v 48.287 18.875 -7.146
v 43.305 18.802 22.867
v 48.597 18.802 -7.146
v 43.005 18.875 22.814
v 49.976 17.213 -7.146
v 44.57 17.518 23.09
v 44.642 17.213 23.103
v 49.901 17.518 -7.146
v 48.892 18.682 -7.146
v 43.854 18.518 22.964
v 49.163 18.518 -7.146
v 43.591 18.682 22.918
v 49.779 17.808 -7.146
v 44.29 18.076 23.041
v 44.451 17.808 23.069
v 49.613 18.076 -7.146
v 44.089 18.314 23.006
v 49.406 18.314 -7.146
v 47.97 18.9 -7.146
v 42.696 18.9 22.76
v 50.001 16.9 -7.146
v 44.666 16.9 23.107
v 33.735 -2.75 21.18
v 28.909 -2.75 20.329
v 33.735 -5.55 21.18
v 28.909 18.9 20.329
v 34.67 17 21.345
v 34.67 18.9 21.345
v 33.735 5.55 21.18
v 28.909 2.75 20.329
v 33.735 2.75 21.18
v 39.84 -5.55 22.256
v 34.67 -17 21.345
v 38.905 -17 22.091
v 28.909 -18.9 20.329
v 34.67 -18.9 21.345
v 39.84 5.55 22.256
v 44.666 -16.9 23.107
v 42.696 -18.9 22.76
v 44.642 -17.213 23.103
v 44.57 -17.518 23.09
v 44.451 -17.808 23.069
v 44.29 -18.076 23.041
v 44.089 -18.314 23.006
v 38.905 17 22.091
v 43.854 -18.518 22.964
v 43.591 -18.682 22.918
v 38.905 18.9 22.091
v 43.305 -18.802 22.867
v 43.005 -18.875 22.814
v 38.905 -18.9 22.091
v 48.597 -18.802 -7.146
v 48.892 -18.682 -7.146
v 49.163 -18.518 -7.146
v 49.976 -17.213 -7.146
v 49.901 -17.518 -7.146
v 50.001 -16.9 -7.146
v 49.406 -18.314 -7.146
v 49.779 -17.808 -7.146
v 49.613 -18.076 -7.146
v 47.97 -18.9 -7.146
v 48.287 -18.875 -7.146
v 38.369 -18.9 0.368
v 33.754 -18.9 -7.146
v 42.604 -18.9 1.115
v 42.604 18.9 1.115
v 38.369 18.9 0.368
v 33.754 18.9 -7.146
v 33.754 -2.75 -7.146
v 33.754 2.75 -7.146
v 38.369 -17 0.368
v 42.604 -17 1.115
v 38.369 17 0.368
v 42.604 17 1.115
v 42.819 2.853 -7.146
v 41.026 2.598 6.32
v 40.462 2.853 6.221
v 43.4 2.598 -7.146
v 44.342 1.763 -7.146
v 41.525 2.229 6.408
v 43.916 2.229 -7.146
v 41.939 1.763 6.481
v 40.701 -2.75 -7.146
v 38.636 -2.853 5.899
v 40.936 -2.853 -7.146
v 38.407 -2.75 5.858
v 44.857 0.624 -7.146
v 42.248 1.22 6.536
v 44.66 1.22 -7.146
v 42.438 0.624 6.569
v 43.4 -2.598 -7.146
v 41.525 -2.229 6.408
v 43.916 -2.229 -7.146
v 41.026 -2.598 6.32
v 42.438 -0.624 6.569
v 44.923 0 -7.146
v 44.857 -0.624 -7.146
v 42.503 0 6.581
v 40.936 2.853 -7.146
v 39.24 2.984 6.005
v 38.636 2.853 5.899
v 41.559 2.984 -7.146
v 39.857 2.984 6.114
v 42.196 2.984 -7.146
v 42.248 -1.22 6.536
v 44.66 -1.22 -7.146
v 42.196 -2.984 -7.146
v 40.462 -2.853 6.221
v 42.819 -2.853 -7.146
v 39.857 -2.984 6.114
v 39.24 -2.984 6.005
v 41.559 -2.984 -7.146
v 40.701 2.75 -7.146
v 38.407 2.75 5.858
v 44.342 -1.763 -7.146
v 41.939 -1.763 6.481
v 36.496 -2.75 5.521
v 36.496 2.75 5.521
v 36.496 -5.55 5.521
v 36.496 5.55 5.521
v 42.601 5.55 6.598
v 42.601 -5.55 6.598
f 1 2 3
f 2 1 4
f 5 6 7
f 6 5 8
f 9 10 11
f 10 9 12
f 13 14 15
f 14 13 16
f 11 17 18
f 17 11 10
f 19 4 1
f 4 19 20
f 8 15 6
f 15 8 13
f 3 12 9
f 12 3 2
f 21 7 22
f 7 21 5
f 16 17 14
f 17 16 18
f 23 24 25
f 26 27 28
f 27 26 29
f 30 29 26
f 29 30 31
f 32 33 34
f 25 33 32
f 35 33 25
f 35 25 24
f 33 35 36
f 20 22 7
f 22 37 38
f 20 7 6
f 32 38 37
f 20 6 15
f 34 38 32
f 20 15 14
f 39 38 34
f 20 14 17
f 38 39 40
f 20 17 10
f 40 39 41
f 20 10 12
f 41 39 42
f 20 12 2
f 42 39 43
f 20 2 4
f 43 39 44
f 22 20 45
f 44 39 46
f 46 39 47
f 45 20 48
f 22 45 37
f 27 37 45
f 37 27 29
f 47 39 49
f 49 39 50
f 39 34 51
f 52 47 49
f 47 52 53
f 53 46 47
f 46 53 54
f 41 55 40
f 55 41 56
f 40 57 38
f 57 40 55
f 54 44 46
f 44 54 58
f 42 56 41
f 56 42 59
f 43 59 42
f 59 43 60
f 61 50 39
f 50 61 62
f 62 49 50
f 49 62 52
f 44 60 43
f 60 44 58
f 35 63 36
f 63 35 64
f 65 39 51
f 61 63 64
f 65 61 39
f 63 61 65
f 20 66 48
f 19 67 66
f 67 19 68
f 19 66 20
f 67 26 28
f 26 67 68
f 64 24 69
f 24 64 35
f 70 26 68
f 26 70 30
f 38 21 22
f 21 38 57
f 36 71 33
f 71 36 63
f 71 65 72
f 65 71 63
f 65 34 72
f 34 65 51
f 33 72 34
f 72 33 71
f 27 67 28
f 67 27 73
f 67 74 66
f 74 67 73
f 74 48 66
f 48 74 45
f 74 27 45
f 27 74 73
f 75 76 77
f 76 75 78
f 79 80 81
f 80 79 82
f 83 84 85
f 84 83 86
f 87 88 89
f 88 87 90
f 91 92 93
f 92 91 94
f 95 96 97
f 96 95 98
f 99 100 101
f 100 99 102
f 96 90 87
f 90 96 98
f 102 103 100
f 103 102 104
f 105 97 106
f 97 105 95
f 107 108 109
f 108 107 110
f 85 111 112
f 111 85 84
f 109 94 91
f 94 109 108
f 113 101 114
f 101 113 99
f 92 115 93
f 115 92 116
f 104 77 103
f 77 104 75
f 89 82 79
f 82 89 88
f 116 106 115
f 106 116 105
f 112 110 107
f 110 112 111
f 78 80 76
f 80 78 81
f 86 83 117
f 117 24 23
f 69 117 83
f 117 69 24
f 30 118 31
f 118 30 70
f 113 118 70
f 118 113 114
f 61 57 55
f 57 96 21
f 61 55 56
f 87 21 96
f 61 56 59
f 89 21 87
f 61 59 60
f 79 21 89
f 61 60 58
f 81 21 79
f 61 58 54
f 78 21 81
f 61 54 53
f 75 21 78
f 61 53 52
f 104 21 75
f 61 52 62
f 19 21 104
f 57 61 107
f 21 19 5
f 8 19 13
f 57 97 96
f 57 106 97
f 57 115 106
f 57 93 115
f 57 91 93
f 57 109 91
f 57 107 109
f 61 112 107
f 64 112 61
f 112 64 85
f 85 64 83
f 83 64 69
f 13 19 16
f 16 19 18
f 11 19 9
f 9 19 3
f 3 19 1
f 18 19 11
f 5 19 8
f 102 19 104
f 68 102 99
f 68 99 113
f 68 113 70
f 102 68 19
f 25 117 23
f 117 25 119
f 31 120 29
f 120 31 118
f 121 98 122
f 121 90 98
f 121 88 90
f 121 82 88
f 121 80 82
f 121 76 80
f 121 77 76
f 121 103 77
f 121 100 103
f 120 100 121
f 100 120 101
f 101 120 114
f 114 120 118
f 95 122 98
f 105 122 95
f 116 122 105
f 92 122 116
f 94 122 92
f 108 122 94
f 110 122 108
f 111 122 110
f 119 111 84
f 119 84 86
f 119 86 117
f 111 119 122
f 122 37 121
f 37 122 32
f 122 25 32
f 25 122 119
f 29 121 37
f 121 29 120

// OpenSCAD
// preview[view:south west, tilt:top diagonal]
include <MCAD/boxes.scad>  // Include Boxes library to get easy rounded boxes

/* [Top holder spec] */
// Which one would you like to see?
part = "second"; // [first:Top holder,second:Connector]

// Text line 1, example: Phone model name
phone_name = "phone";

// Font size for text line 2, "TextLabel"
font_size = 11; // [3:29]

// Text line 2, example: Your own name 
TextLabel = "Name";
font = "REGISTRATION PLATE UK:style=Bold";

// The width of your phone including any cover you have on it (in mm)
phone_width = 63; // [50:150]

// The length from the back of the connector to the back of the phone (in mm)
phone_depth = 4; // [0:0.1:7]

// Add extra support on the side holders?
support = 0; // [1:Yes,0:No]

// Only needed if you have extra support: The total depth/thickness of your phone (in mm)
phone_thickness = 12; // [2:0.1:16]


/* [Connector adapter spec] */
// The width of the connector (in mm)
connector_width = 11.1; // [0:0.1:32]

// The depth of the connector (in mm)
connector_depth = 6.2; // [0:0.1:14]

// The height of the connector (in mm)
connector_height = 17; // [0:0.1:29]

// Advanced: Offset of the connector (experimental) (in mm)
offset = 0; // [-10:0.1:10]

// Advanced: Add 10 mm to the phone depth (experimental)
extraD = 0; // [1:Yes,0:No]

// The shape of the connector
connector_shape = "square"; // [square:Square,ellipse:Ellipse]

module oval(w,h, height, center = false) {
  scale([1, h/w, 1]) cylinder(h=height, r=w, center=center, $fs = 0.01);
}

print_part();

module print_part() {
	if (part == "first") {
		topholder();
	} else if (part == "second") {
		connector();
	} else {
		topholder();
	}
}

module topholder() {

rotate([180,0,180]) {
// Difference will construct a main shape and subtract cut outs
difference() {
    
  // Main Shape
  union(){
    translate([((phone_thickness+extraD*10+11-phone_depth)/2)-2,0,0]) {
    roundedBox([phone_thickness+extraD*10+11-phone_depth+4, phone_width+8, 30], 4, true, $fn=40);
    }
    roundedBox([26, 50, 30], 4, true, $fn=40);
  } // End union
  
  // Cut outs
  translate([20,0,0]) {
    cube([40,phone_width,32],true);
    cube([42,49,32],true);   
    }
    translate([-6.1,0,5]) {
      cube([4.2,42,35],true);
    }
   
   if (support == 0) { 
    translate([phone_thickness+extraD*10+11-phone_depth-2,0,0]) {    
      cube([4, 300, 32], true);
    }
    }
   
  } // End difference
    
// Add ons
  
difference() {
  union(){
    translate([-4,-25,-15]) {
      cube([4,50,51.1],false);
      cube([11-phone_depth,50,45],false);
    }

    translate([-3.9,-10,-15]) {
      cube([2.05,20,54.1],false);
    }
      
if (support == 0) {

    translate([((phone_thickness+extraD*10+11-phone_depth))-4,phone_width/2+2,0]) {    
      roundedBox([4, 4, 30], 2, true, $fn=40);
    }
    
    translate([((phone_thickness+extraD*10+11-phone_depth))-4,-phone_width/2-2,0]) {    
      roundedBox([4, 4, 30], 2, true, $fn=40);
    }
    
    }



if (support == 1) {

    translate([((phone_thickness+extraD*10+11-phone_depth))-2,phone_width/2-1,0]) {    
      roundedBox([4, 5.5, 30], 2, true, $fn=40);
    }
    
    translate([((phone_thickness+extraD*10+11-phone_depth))-2,-phone_width/2+1,0]) {    
      roundedBox([4, 5.5, 30], 2, true, $fn=40);
    }
    
    }
    
  } // End union
  
  // Cut out text
   translate([6-phone_depth,0,11]) {
    rotate([90,180,90]) {
      linear_extrude(height = 1.5) {
        text(text = str(TextLabel), font = font, size = font_size, valign = "center", halign = "center");
      }
    }
    }
    
     translate([6-phone_depth,0,-10]) {
    rotate([90,180,90]) {
      linear_extrude(height = 1.5) {
        text(text = str(phone_name), font = font, size = 4, valign = "center", halign = "center");
      }
    }
    }
} // End difference

}
}


module connector() {

if (extraD == 0) {
rotate([0,10,180]) {
  translate([-40,0,-0.5]) {
// Difference will construct a main shape and subtract cut outs
difference() {
    
  // Main Shape
  union(){
    translate([0,0,0]) {
    roundedBox([16, 37.8, 31], 2, true, $fn=40);
    }
    translate([0,-18.9,-15.5]) {
      cube([8, 37.8, 31], false);
    }
  } // End union
  
  // Cut outs
  translate([-2.15,17,-5.8]) {
    cube([4.3,2.10,21.34],false);   
  }
  
  translate([-2.15,-17-2.10,-5.8]) {
    cube([4.3,2.10,21.34],false);
  }
  
  translate([0,offset,0]) {
    cylinder( 35,3,3, true, $fn=30);
  }
  
  translate([0,-2.75+offset,-18]) {
    cube([10,5.5,35],false);
  }
  
  rotate([0,-10,0]) {
    translate([-15,-20,-18.6]) {
      cube([25,40,5],false);
    }
  }
  
  // Customized hole
    if(connector_shape == "square") {
      translate([-connector_depth/2,-connector_width/2+offset,15.6-(connector_height-1)]) {  
          cube([connector_depth,connector_width,connector_height-1],false);
      }
    } else {
     translate([0,offset,15.6-(connector_height-1)]) {  
          oval(connector_depth/2,connector_width/2,connector_height-1,false);
      }
    }
  
  } // End difference
    
}
}
}

if (extraD == 1) {
rotate([0,10,180]) {
  translate([-40,0,-0.5]) {
// Difference will construct a main shape and subtract cut outs
difference() {
    
  // Main Shape
  union(){
    translate([-8,0,-2]) {
    roundedBox([20, 37.8, 35], 2, true, $fn=40);
    }
    translate([0,-18.9,-15.5]) {
      cube([8, 37.8, 31], false);
    }
  } // End union
  
  // Cut outs
  translate([-2.15,17,-5.8]) {
    cube([4.3,2.10,21.34],false);   
  }
  
  translate([-2.15,-17-2.10,-5.8]) {
    cube([4.3,2.10,21.34],false);
  }
  
  translate([-10,-2.75+offset,-18]) {
    cube([20,5.5,35],false);
  }
  
  union(){
      translate([-10,0,0]) {
  translate([0,offset,0]) {
    cylinder( 35,3,3, true, $fn=30);
  }
  
  rotate([0,-10,0]) {
    translate([-35,-20,-23.6]) {
      cube([55,40,10],false);
    }
  }
  
  // Customized hole
  translate([-connector_depth/2,-connector_width/2+offset,15.6-(connector_height-1)]) {
    cube([connector_depth,connector_width,connector_height-1],false);
  }
  }
  }
  
  } // End difference
    
}
}
}


}
